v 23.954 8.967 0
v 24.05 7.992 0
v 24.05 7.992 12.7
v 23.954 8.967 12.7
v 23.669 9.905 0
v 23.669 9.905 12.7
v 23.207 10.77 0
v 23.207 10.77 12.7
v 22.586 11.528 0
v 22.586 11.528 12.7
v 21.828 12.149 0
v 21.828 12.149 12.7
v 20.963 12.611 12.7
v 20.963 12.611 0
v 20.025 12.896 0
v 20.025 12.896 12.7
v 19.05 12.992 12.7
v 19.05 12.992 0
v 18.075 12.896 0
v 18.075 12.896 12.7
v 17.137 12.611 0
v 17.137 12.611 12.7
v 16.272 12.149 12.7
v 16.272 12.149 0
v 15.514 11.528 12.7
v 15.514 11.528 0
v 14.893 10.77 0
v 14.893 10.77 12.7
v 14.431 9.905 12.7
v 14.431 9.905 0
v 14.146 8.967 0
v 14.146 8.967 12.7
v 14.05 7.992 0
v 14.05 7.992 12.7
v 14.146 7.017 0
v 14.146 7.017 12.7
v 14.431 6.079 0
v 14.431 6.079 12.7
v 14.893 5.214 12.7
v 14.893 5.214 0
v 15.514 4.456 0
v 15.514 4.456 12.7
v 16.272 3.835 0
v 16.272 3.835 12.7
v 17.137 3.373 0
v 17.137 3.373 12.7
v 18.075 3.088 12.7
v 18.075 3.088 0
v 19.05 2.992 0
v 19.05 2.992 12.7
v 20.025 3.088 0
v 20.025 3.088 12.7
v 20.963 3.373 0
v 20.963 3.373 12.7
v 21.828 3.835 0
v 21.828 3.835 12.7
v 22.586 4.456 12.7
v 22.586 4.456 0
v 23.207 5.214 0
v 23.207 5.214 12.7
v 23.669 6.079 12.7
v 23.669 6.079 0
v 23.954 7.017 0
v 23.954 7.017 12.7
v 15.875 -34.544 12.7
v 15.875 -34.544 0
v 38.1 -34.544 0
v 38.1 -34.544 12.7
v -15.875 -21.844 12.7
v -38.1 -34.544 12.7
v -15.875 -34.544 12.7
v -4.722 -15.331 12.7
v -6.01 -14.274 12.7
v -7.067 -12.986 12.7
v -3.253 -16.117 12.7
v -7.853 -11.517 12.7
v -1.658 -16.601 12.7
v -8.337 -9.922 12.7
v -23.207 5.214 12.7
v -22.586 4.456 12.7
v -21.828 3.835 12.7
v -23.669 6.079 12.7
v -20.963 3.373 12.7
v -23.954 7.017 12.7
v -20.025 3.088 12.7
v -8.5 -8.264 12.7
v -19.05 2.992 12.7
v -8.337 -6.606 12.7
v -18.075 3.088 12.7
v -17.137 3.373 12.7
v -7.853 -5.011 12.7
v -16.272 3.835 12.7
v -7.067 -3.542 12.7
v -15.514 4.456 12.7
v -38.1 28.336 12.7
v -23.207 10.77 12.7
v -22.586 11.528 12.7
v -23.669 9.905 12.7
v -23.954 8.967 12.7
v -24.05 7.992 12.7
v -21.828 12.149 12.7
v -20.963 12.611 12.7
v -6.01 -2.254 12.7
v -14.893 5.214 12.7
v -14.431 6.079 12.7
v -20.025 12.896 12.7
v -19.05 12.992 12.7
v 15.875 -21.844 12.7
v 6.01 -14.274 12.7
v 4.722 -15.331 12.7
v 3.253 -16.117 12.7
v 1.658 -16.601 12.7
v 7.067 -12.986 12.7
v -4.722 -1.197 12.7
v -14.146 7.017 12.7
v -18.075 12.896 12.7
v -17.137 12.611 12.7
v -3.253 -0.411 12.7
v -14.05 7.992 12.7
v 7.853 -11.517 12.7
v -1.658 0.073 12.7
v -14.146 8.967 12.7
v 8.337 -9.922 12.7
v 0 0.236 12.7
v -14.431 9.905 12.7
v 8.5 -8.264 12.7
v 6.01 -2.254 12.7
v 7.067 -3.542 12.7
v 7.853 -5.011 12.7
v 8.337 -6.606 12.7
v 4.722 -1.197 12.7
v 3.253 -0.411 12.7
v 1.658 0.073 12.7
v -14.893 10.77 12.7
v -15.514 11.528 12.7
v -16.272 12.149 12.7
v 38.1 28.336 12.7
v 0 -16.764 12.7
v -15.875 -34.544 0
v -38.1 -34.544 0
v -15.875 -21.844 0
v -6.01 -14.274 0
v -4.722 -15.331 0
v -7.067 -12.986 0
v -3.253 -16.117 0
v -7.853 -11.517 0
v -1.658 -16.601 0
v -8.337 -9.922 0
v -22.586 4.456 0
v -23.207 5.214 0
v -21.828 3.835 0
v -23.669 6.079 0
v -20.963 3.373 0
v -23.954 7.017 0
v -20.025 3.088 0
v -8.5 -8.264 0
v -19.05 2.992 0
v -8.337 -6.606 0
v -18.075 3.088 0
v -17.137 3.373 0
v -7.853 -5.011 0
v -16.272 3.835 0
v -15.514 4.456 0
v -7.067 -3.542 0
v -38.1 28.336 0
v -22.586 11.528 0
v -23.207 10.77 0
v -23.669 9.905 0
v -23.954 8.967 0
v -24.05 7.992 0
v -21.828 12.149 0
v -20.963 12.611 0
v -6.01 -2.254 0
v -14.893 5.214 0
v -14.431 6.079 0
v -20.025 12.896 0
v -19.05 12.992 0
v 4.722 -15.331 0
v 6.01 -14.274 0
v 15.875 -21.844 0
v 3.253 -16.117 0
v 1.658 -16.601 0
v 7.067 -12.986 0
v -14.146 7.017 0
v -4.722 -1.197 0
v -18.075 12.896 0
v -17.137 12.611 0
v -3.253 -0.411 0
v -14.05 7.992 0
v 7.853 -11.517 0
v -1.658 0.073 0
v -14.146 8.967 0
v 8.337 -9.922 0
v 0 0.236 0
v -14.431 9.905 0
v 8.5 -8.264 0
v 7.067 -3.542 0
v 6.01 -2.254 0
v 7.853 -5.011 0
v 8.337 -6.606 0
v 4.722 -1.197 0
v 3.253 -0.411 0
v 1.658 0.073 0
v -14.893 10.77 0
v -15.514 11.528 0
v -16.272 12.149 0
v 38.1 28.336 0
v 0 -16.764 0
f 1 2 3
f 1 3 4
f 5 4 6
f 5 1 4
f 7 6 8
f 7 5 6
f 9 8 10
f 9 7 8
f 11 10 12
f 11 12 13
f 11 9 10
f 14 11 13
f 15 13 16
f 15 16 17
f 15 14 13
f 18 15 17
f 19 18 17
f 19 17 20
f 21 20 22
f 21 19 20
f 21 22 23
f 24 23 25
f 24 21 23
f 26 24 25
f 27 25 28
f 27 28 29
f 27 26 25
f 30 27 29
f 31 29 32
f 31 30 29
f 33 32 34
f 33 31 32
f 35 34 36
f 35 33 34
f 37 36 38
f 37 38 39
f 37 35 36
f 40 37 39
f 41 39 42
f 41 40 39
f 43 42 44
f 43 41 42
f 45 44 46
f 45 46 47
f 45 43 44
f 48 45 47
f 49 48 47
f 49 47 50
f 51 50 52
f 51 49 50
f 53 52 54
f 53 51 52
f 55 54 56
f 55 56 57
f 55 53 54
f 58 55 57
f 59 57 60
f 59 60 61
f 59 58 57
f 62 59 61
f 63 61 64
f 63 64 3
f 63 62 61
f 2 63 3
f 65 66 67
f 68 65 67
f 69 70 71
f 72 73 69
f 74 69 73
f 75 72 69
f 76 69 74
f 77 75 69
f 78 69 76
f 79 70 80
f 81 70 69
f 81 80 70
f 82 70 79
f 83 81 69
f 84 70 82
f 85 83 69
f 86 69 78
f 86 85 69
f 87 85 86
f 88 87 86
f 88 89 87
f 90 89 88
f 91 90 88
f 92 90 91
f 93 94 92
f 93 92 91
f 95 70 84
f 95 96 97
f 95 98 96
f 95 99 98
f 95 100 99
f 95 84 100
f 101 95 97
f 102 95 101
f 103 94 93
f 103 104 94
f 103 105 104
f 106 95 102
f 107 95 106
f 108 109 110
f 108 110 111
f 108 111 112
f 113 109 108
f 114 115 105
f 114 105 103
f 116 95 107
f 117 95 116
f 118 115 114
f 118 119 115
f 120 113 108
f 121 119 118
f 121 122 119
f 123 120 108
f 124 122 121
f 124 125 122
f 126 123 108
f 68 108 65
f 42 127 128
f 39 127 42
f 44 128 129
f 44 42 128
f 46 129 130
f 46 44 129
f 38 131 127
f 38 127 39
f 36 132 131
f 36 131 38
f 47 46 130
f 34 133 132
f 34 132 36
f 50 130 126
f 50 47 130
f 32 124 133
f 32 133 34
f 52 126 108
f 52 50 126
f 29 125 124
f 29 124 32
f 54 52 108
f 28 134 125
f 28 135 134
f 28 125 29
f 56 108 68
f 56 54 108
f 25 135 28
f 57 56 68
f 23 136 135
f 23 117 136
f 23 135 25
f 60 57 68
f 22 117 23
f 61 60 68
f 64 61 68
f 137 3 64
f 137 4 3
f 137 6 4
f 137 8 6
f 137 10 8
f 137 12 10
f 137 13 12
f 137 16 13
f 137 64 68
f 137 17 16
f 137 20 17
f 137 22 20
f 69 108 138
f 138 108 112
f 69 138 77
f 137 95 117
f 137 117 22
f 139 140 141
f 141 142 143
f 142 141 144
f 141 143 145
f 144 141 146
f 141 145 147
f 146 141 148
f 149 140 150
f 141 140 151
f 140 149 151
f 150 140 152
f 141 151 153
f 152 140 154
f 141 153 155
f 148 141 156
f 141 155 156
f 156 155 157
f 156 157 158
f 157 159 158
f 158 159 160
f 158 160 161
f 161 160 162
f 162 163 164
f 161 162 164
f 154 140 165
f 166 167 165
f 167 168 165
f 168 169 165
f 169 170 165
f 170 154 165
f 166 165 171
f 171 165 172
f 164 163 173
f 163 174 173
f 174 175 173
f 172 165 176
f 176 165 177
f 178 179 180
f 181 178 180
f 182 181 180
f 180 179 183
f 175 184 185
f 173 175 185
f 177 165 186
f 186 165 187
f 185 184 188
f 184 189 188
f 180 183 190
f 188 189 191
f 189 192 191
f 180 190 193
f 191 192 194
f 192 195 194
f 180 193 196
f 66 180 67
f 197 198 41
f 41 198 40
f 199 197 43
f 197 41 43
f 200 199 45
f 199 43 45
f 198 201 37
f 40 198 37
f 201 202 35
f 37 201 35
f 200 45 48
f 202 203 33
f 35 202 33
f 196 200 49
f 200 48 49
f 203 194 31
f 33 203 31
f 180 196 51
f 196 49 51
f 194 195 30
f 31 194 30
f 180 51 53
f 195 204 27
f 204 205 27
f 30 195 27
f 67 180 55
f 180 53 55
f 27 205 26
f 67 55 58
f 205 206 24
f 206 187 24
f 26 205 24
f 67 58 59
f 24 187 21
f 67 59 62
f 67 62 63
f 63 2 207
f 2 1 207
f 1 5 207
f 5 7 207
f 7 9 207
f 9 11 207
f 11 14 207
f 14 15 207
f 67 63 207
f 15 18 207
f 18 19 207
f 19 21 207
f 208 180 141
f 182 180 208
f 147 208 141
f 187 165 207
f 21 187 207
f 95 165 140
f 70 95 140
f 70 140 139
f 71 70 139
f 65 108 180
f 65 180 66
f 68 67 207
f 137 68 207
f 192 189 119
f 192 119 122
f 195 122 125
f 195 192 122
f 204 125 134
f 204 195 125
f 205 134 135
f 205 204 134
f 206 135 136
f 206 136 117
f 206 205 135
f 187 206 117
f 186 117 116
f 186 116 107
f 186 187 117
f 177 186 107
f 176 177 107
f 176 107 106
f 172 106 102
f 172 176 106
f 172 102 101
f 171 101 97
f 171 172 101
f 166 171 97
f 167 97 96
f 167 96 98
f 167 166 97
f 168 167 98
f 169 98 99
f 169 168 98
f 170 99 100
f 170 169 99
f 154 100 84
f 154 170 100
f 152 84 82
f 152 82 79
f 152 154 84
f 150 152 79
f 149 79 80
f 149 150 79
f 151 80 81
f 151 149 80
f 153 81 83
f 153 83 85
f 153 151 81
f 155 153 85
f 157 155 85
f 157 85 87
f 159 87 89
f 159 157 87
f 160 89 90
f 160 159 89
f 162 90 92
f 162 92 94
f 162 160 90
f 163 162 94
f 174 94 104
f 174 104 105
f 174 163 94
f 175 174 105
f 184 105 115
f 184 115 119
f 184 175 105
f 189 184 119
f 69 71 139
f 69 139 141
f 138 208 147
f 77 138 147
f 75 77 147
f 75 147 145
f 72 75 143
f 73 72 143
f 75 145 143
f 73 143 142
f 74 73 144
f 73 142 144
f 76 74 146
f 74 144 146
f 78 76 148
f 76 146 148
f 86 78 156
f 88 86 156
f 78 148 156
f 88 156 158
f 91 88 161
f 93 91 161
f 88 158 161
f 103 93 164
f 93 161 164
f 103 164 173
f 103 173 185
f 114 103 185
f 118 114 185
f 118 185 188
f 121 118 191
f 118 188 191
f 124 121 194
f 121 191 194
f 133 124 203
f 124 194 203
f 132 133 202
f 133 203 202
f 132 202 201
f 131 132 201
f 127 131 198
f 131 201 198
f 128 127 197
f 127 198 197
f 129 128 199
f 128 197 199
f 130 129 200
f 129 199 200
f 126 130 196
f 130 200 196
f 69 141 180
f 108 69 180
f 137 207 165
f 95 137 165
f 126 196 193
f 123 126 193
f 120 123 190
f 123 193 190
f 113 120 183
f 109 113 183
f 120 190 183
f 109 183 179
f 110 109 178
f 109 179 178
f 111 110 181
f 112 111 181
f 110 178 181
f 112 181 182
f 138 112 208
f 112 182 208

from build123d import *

# Parameters (mm, degrees)
SKETCH1_R           = 5
BOSS_EXTRUDE1_DEPTH = 12.7


with BuildPart() as part:
    # Sketch1 → Boss-Extrude1 (new body)
    with BuildSketch(Plane.XY):
        Polygon((-38.1, -34.544), (-15.875, -34.544), (-15.875, -21.844), (0, -21.844), (15.875, -21.844), (15.875, -34.544), (38.1, -34.544), (38.1, 28.336368082), (-19.05, 28.336368082), (-38.1, 28.336368082), align=None)
        with BuildLine():
            ThreePointArc((8.5, -8.264), (6.01040764, -14.27440764), (0, -16.764))
            ThreePointArc((0, -16.764), (-6.01040764, -2.25359236), (8.5, -8.264))
        make_face(mode=Mode.SUBTRACT)
        with Locations((-19.05, 7.992)):
            Circle(SKETCH1_R, mode=Mode.SUBTRACT)
        with Locations((19.05, 7.992)):
            Circle(SKETCH1_R, mode=Mode.SUBTRACT)
    extrude(amount=BOSS_EXTRUDE1_DEPTH)


solid = part.part
